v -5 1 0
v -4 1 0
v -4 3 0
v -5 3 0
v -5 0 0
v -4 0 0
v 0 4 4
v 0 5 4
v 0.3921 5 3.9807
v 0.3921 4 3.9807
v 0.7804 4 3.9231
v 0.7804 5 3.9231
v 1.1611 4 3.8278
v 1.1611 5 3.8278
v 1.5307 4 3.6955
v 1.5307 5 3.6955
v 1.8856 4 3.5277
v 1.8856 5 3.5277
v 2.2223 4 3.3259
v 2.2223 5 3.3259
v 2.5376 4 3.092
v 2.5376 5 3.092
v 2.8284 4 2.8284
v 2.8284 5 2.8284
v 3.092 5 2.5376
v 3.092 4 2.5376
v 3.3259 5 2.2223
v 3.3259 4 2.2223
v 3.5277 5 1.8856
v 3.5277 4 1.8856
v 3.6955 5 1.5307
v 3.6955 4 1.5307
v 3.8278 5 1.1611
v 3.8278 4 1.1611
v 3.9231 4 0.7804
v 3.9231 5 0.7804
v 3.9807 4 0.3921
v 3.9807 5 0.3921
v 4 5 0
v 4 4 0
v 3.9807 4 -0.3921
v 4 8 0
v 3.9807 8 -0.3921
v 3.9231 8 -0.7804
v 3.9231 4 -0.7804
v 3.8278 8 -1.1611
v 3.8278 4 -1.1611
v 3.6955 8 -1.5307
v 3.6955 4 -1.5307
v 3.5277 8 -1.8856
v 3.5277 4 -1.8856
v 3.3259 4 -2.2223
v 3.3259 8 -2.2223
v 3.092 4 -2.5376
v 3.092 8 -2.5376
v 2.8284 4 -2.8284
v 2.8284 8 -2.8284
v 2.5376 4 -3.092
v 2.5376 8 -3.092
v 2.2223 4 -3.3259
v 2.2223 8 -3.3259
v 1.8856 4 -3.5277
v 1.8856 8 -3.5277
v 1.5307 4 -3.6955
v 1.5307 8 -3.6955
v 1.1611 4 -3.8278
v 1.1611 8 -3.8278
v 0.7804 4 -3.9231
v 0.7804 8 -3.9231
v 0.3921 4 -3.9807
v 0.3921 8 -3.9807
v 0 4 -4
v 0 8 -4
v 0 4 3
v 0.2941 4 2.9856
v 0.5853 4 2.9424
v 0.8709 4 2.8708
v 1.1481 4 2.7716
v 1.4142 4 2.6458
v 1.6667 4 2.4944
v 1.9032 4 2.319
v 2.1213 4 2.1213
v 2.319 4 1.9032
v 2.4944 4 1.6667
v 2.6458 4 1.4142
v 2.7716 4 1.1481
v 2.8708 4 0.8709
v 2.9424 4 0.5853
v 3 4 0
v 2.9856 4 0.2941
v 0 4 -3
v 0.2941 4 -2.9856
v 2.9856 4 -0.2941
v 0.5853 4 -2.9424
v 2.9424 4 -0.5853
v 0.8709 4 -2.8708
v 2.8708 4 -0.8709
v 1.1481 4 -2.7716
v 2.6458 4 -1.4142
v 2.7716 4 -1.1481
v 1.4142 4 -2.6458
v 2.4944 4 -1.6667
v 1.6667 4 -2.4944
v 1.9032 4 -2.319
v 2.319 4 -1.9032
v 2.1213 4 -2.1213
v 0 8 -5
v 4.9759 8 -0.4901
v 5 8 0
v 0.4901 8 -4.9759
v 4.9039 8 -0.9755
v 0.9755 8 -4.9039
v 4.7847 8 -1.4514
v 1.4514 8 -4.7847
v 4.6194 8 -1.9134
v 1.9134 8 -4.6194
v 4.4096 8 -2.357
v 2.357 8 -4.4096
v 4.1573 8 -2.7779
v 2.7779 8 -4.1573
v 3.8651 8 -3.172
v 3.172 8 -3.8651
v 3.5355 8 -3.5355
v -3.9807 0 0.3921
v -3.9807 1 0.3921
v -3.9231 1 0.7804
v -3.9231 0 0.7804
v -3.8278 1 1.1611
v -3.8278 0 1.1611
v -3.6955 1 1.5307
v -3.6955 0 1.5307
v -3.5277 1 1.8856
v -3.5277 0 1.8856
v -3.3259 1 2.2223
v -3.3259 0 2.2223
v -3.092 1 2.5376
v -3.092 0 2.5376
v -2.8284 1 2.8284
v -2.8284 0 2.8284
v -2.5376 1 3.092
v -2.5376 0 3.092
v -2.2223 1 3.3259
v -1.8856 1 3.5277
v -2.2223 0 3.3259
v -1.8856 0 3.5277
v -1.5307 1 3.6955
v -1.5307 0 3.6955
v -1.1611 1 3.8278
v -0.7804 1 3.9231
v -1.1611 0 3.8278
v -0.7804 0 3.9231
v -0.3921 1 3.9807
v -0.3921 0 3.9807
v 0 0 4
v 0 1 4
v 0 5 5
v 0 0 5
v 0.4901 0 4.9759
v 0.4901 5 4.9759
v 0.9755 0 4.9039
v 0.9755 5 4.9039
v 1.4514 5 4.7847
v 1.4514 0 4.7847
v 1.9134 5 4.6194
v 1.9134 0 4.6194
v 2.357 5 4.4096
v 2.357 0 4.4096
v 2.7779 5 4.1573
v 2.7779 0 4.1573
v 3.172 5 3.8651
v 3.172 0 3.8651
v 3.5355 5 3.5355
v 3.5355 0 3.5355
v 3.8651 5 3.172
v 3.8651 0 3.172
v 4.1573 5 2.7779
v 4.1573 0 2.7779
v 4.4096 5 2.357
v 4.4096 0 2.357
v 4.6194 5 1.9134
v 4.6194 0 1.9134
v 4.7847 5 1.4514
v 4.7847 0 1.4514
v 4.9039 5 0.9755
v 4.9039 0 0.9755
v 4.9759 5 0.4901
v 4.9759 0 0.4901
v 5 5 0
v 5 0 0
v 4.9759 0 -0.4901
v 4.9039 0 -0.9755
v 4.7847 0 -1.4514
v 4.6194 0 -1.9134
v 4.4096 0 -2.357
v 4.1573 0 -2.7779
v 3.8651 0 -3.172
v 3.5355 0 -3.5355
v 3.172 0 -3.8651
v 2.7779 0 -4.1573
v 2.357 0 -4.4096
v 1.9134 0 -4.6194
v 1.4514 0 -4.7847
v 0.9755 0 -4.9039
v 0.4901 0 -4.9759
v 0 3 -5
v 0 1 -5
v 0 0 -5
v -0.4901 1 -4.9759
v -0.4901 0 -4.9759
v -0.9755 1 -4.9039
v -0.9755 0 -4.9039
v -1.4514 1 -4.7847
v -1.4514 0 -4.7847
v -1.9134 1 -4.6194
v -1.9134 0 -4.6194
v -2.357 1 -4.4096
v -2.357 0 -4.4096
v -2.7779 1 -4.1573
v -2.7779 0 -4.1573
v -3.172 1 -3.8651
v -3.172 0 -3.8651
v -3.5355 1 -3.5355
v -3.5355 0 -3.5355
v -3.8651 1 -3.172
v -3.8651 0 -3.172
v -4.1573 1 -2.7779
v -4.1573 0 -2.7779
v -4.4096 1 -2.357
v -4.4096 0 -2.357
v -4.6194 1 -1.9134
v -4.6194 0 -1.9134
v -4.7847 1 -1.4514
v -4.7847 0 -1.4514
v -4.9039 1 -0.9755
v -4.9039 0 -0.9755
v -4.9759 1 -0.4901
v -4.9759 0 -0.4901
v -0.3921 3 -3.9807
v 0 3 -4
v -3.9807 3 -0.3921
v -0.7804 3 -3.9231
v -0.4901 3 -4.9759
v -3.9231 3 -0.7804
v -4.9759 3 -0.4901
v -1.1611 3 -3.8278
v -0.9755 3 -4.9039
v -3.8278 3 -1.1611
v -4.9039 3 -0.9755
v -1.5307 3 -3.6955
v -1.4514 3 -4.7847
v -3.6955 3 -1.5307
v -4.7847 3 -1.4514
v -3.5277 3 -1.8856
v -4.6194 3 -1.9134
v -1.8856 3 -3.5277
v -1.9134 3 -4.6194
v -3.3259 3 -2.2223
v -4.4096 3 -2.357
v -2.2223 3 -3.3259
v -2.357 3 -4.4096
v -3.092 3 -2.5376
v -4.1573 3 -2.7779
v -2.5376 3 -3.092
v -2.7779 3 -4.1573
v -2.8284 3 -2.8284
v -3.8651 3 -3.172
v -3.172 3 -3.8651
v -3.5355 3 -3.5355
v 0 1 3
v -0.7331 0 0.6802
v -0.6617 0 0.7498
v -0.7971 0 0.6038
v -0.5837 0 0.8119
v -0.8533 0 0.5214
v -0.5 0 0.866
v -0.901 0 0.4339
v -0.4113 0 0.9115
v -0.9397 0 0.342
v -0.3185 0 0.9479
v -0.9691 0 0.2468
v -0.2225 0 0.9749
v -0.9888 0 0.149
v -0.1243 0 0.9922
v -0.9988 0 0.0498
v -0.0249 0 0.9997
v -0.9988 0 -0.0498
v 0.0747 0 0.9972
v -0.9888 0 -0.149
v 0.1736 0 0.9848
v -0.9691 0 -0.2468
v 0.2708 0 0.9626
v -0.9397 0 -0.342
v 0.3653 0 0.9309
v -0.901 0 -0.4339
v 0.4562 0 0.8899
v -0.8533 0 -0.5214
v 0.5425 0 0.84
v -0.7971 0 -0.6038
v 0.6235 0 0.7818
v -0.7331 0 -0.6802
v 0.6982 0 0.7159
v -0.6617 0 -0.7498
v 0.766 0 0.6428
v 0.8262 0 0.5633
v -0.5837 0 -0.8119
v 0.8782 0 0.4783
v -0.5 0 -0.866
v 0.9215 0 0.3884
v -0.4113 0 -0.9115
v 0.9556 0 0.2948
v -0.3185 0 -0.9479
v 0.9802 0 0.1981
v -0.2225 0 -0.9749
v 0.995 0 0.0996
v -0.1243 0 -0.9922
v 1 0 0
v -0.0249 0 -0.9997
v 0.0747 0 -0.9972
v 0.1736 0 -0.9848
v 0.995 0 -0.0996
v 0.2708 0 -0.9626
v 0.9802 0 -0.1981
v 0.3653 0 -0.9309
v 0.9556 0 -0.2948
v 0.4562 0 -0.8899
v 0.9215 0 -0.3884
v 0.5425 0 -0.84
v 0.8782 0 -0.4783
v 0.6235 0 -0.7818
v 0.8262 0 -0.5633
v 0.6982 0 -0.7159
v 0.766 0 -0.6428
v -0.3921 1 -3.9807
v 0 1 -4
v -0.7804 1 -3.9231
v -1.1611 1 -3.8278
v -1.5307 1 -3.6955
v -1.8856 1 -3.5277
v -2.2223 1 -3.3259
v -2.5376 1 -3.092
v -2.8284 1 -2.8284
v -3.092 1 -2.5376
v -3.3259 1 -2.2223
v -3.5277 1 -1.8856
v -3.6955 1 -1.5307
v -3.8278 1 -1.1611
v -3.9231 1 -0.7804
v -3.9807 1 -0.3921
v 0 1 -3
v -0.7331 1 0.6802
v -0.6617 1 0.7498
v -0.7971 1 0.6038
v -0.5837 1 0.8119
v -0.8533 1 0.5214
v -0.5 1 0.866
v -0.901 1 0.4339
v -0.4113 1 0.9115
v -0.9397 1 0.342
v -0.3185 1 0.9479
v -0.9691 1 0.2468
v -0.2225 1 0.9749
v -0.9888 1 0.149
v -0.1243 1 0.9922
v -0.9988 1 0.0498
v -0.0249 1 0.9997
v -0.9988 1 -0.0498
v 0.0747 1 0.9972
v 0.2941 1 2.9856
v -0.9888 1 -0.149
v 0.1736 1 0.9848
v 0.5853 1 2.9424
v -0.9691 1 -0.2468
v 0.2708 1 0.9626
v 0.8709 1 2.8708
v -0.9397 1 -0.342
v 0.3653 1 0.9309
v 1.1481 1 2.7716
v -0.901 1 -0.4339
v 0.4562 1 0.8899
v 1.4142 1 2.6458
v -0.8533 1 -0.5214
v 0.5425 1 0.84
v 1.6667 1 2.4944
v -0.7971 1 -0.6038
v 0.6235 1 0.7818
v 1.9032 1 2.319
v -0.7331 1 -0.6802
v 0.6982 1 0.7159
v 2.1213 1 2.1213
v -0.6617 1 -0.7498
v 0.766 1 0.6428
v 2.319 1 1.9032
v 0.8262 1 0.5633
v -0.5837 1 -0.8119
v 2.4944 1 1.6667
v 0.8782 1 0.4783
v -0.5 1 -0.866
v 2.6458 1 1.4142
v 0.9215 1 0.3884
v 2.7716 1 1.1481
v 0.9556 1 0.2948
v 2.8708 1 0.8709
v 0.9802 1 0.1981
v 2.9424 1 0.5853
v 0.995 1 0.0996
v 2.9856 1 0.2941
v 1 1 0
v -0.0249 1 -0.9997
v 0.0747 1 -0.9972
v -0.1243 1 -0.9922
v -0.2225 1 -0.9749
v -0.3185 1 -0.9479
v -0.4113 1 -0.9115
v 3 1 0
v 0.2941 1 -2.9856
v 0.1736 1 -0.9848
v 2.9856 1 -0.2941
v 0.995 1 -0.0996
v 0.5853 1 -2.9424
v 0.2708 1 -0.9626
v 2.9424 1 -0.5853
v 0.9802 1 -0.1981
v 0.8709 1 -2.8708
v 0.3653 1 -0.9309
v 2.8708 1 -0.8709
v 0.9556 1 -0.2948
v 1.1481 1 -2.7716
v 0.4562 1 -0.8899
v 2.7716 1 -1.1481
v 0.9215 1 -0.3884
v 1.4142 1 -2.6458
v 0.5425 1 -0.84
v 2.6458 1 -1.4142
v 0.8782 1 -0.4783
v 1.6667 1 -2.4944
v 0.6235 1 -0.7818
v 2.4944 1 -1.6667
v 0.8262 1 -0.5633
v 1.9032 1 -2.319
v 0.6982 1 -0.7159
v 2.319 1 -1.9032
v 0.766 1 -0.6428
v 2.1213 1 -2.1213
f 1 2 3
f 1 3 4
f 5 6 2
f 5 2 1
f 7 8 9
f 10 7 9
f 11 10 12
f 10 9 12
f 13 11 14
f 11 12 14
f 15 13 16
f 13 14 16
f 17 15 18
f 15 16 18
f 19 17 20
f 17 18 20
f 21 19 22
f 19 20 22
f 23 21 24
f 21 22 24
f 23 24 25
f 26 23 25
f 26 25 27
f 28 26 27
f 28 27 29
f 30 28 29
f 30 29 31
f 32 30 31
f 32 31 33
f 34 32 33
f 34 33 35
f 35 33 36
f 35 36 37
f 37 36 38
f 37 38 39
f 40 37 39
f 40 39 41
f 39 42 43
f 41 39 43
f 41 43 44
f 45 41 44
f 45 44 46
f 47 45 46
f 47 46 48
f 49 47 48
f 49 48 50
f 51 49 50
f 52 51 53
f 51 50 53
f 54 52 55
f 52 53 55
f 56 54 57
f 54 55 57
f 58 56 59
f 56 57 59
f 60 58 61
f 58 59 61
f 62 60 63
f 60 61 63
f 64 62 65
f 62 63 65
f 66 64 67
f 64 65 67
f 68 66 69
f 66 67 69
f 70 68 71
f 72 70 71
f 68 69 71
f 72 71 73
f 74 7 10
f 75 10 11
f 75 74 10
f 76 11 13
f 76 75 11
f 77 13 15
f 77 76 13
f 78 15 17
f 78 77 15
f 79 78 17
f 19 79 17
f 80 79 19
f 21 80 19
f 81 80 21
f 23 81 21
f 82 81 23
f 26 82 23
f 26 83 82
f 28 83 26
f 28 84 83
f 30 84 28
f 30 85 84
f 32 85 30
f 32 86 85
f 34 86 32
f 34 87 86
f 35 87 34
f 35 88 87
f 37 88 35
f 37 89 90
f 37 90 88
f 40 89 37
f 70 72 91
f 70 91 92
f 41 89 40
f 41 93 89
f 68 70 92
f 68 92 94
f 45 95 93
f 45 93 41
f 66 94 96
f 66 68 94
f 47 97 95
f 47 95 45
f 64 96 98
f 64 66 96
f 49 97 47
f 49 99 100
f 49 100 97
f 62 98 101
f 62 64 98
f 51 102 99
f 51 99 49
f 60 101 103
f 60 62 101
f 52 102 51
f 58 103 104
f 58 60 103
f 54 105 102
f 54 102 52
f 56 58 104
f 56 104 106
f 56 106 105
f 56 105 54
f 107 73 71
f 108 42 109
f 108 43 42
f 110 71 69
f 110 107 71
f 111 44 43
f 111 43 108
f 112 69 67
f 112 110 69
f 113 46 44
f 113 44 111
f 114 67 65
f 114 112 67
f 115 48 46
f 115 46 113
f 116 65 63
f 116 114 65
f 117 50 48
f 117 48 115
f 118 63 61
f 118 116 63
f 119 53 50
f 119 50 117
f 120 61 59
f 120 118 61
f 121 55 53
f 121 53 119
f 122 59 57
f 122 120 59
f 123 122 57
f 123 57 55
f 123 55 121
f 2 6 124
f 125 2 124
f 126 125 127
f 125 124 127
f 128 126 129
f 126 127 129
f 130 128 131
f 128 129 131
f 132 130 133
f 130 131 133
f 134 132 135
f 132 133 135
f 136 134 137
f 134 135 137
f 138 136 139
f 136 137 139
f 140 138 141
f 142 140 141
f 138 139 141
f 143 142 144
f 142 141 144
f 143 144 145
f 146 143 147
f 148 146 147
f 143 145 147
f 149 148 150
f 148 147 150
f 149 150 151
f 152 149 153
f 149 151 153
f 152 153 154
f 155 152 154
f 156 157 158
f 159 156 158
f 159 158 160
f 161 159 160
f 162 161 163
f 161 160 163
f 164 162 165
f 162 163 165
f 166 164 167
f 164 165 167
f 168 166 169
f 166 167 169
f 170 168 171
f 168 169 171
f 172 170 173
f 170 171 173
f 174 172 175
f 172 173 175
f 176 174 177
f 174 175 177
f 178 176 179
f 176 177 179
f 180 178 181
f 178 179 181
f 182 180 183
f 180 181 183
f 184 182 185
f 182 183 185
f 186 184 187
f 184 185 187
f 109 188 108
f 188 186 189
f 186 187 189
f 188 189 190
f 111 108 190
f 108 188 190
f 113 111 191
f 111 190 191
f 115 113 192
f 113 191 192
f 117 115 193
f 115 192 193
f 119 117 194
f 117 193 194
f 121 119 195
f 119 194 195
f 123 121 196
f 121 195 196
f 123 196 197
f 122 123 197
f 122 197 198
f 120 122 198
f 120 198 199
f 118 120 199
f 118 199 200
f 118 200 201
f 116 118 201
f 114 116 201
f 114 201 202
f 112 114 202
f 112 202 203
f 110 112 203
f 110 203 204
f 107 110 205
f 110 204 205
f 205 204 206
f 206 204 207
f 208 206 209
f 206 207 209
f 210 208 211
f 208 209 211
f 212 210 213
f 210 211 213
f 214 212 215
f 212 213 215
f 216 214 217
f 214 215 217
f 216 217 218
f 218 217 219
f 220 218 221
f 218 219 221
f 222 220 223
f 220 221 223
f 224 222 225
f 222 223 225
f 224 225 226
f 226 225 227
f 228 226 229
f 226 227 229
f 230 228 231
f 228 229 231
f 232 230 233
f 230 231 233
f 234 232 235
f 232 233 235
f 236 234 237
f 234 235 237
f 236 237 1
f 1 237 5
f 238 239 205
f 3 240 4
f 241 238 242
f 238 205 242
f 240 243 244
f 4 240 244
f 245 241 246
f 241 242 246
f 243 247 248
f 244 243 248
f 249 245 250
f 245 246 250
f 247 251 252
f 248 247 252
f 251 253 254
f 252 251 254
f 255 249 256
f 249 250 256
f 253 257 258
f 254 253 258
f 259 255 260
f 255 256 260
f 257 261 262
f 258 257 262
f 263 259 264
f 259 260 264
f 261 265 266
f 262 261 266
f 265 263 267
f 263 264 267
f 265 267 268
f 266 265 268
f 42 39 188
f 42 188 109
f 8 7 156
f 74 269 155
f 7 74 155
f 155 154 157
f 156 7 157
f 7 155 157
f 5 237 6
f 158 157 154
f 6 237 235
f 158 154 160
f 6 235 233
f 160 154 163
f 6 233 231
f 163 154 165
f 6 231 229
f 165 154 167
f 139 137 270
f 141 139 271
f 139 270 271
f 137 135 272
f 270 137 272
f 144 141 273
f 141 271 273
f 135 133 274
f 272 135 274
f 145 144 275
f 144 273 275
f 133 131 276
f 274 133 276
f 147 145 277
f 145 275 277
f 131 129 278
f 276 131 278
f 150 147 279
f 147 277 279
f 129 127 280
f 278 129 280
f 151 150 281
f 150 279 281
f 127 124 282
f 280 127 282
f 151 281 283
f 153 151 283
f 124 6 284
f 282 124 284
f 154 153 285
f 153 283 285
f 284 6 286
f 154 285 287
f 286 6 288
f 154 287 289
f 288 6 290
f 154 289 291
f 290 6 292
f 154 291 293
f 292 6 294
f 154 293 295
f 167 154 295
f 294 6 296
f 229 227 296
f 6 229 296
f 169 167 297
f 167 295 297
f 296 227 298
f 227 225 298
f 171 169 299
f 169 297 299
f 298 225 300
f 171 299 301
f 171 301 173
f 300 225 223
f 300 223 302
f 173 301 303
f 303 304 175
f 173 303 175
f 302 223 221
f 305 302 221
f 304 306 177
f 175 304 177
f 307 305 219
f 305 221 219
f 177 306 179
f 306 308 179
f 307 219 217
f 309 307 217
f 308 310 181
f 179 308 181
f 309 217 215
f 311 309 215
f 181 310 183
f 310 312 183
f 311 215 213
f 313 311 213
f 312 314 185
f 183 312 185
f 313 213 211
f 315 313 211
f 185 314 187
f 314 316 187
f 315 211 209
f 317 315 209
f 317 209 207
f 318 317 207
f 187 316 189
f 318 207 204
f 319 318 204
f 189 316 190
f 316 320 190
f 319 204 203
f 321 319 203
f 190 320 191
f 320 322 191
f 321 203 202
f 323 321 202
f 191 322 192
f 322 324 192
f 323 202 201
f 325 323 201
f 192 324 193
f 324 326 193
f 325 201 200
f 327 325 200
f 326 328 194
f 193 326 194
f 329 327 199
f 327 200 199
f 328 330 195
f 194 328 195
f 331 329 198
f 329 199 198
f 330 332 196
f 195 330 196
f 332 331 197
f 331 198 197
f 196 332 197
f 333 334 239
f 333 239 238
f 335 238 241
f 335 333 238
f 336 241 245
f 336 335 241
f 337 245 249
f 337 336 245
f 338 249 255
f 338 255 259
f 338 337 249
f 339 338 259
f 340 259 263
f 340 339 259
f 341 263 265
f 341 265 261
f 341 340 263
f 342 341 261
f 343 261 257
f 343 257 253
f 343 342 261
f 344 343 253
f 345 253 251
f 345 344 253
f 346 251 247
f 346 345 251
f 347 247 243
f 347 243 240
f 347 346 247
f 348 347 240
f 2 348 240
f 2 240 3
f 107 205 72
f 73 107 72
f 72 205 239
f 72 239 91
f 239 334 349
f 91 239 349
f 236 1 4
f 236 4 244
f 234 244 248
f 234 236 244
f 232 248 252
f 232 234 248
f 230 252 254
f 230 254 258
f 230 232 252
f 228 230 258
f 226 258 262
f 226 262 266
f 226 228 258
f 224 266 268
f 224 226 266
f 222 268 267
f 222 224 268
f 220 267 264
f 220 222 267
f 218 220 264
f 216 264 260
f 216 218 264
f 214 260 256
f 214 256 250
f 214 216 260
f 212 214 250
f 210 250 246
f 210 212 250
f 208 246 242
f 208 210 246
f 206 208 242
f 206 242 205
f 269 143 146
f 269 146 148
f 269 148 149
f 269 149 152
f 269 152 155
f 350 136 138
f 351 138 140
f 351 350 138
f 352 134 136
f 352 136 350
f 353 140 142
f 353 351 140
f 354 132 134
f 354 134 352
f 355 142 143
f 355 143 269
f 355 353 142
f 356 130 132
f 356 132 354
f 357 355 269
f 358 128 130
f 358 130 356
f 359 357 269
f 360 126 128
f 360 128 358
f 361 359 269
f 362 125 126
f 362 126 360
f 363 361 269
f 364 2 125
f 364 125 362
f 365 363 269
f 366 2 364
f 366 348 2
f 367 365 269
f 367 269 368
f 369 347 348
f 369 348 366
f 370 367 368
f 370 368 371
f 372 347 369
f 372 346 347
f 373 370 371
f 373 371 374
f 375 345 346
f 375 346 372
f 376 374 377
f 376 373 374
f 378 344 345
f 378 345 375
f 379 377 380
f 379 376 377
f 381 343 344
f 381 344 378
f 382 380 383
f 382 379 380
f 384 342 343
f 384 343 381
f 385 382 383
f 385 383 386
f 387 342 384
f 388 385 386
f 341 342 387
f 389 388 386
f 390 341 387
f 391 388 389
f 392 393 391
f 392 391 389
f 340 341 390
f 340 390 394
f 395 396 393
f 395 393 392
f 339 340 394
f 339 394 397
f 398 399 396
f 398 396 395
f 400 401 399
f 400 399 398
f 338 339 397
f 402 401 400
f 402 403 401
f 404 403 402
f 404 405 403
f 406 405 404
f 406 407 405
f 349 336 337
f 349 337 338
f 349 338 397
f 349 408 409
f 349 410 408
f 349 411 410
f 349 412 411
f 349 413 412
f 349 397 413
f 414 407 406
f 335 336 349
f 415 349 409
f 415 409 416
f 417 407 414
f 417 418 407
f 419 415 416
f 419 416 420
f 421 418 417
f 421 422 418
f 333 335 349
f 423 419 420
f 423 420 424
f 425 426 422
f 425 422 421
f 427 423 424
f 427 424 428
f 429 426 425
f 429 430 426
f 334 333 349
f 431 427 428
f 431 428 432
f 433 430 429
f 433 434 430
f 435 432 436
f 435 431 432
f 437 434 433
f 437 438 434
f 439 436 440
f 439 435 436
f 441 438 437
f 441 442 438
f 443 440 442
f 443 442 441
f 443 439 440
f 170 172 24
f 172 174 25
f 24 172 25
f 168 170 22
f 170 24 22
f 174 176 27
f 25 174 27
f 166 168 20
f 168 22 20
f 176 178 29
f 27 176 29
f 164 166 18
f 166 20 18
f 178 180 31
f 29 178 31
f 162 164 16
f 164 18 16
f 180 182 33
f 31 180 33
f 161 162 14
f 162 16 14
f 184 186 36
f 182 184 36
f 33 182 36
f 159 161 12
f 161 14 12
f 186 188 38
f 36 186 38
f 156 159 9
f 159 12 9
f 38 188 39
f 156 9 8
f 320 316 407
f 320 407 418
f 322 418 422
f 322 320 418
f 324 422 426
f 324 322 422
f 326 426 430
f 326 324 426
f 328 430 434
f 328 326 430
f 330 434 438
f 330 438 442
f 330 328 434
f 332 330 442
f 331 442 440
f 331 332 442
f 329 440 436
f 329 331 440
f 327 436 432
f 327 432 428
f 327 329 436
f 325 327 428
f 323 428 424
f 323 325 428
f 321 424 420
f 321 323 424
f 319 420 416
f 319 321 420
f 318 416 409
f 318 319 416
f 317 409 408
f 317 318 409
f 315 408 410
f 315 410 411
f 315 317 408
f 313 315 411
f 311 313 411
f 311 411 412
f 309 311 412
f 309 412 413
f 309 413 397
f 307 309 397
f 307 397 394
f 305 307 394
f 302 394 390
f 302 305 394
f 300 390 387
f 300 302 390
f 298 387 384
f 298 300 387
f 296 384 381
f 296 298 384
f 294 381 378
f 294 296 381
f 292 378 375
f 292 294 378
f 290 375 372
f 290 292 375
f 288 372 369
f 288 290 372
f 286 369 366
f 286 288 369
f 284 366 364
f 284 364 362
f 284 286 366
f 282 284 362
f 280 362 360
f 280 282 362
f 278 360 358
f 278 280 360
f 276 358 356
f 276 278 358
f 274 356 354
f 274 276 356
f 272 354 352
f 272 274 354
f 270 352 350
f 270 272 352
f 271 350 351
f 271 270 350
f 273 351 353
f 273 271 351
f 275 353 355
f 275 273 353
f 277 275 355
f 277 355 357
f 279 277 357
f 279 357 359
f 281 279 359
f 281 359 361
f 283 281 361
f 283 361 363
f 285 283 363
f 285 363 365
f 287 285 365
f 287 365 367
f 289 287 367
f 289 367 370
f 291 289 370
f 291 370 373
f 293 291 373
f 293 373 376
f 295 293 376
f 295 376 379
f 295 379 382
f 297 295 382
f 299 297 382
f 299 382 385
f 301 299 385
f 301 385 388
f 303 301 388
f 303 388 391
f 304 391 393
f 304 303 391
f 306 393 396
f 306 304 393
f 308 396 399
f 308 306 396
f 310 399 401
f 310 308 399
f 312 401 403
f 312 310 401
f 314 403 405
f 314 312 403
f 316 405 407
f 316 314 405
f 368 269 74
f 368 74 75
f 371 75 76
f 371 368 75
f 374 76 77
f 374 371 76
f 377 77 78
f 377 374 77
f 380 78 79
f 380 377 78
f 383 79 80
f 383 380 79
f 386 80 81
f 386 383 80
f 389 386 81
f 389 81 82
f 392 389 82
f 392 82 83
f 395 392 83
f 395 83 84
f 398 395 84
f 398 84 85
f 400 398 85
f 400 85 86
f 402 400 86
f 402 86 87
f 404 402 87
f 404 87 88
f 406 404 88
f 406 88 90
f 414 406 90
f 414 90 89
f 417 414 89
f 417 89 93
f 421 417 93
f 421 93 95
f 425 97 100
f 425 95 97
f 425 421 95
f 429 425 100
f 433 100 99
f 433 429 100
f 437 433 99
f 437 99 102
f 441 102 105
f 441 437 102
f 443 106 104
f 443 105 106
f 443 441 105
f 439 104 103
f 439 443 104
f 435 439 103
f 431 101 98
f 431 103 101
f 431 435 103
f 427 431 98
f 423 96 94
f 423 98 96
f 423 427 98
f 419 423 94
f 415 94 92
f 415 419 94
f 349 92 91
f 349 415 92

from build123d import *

# Parameters (mm, degrees)
SKETCH1_R               = 1
BOSS_EXTRUDE1_DEPTH     = 1
BOSS_EXTRUDE2_DEPTH     = 4
BOSS_EXTRUDE3_DEPTH     = 3
SKETCH6_W               = 5
SKETCH6_H               = 3
CUT_EXTRUDE1_DEPTH      = 6
CUT_EXTRUDE2_DEPTH      = 3
CUT_EXTRUDE2_DEPTH_BACK = 1
SKETCH7_R               = 4
BOSS_EXTRUDE4_DEPTH     = 2


with BuildPart() as part:
    # Sketch1 → Boss-Extrude1 (new body)
    with BuildSketch(Plane(origin=(0, 0, 0), x_dir=(1, 0, 0), z_dir=(0, 1, 0))):
        with BuildLine():
            ThreePointArc((0, -5), (3.535533906, 3.535533906), (-5, 0))
            Line((-5, 0), (-4, 0))
            ThreePointArc((-4, 0), (-2.828427125, -2.828427125), (0, -4))
            Line((0, -4), (0, -5))
        make_face()
        Circle(SKETCH1_R, mode=Mode.SUBTRACT)
    extrude(amount=BOSS_EXTRUDE1_DEPTH)

    # Sketch2 → Boss-Extrude2 (add)
    with BuildSketch(Plane(origin=(0, 1, 0), x_dir=(1, 0, 0), z_dir=(0, 1, 0))):
        with BuildLine():
            Line((0, 3), (0, 5))
            ThreePointArc((0, 5), (5, 0), (0, -5))
            Line((0, -5), (0, -3))
            ThreePointArc((0, -3), (3, 0), (0, 3))
        make_face()
    extrude(amount=BOSS_EXTRUDE2_DEPTH)

    # Sketch4 → Boss-Extrude3 (add)
    with BuildSketch(Plane(origin=(0, 5, 0), x_dir=(1, 0, 0), z_dir=(0, 1, 0))):
        with BuildLine():
            Line((0, 5), (0, 4))
            ThreePointArc((0, 4), (3.883896034, 0), (0, -4))
            Line((0, -4), (0, -5))
            ThreePointArc((0, -5), (5, 0), (0, 5))
        make_face()
    extrude(amount=BOSS_EXTRUDE3_DEPTH)

    # Sketch6 → Cut-Extrude1 (cut)
    with BuildSketch(Plane.ZY):
        with Locations((2.5, 6.5)):
            Rectangle(SKETCH6_W, SKETCH6_H)
    extrude(amount=-CUT_EXTRUDE1_DEPTH, mode=Mode.SUBTRACT)

    # Sketch7 → Cut-Extrude2 (cut, two sides: drawn at the far end of the back side and taken through both)
    with BuildSketch(Plane(origin=(0, 5, 0), x_dir=(1, 0, 0), z_dir=(0, 1, 0)).offset(-CUT_EXTRUDE2_DEPTH_BACK)):
        Circle(SKETCH7_R)
    extrude(amount=CUT_EXTRUDE2_DEPTH + CUT_EXTRUDE2_DEPTH_BACK, mode=Mode.SUBTRACT)

    # Sketch8 → Boss-Extrude4 (add)
    with BuildSketch(Plane(origin=(0, 1, 0), x_dir=(1, 0, 0), z_dir=(0, 1, 0))):
        with BuildLine():
            Line((0, 5), (0, 4))
            ThreePointArc((0, 4), (-2.828427125, 2.828427125), (-4, 0))
            Line((-4, 0), (-5, 0))
            ThreePointArc((-5, 0), (-3.535533906, 3.535533906), (0, 5))
        make_face()
    extrude(amount=BOSS_EXTRUDE4_DEPTH)


solid = part.part
